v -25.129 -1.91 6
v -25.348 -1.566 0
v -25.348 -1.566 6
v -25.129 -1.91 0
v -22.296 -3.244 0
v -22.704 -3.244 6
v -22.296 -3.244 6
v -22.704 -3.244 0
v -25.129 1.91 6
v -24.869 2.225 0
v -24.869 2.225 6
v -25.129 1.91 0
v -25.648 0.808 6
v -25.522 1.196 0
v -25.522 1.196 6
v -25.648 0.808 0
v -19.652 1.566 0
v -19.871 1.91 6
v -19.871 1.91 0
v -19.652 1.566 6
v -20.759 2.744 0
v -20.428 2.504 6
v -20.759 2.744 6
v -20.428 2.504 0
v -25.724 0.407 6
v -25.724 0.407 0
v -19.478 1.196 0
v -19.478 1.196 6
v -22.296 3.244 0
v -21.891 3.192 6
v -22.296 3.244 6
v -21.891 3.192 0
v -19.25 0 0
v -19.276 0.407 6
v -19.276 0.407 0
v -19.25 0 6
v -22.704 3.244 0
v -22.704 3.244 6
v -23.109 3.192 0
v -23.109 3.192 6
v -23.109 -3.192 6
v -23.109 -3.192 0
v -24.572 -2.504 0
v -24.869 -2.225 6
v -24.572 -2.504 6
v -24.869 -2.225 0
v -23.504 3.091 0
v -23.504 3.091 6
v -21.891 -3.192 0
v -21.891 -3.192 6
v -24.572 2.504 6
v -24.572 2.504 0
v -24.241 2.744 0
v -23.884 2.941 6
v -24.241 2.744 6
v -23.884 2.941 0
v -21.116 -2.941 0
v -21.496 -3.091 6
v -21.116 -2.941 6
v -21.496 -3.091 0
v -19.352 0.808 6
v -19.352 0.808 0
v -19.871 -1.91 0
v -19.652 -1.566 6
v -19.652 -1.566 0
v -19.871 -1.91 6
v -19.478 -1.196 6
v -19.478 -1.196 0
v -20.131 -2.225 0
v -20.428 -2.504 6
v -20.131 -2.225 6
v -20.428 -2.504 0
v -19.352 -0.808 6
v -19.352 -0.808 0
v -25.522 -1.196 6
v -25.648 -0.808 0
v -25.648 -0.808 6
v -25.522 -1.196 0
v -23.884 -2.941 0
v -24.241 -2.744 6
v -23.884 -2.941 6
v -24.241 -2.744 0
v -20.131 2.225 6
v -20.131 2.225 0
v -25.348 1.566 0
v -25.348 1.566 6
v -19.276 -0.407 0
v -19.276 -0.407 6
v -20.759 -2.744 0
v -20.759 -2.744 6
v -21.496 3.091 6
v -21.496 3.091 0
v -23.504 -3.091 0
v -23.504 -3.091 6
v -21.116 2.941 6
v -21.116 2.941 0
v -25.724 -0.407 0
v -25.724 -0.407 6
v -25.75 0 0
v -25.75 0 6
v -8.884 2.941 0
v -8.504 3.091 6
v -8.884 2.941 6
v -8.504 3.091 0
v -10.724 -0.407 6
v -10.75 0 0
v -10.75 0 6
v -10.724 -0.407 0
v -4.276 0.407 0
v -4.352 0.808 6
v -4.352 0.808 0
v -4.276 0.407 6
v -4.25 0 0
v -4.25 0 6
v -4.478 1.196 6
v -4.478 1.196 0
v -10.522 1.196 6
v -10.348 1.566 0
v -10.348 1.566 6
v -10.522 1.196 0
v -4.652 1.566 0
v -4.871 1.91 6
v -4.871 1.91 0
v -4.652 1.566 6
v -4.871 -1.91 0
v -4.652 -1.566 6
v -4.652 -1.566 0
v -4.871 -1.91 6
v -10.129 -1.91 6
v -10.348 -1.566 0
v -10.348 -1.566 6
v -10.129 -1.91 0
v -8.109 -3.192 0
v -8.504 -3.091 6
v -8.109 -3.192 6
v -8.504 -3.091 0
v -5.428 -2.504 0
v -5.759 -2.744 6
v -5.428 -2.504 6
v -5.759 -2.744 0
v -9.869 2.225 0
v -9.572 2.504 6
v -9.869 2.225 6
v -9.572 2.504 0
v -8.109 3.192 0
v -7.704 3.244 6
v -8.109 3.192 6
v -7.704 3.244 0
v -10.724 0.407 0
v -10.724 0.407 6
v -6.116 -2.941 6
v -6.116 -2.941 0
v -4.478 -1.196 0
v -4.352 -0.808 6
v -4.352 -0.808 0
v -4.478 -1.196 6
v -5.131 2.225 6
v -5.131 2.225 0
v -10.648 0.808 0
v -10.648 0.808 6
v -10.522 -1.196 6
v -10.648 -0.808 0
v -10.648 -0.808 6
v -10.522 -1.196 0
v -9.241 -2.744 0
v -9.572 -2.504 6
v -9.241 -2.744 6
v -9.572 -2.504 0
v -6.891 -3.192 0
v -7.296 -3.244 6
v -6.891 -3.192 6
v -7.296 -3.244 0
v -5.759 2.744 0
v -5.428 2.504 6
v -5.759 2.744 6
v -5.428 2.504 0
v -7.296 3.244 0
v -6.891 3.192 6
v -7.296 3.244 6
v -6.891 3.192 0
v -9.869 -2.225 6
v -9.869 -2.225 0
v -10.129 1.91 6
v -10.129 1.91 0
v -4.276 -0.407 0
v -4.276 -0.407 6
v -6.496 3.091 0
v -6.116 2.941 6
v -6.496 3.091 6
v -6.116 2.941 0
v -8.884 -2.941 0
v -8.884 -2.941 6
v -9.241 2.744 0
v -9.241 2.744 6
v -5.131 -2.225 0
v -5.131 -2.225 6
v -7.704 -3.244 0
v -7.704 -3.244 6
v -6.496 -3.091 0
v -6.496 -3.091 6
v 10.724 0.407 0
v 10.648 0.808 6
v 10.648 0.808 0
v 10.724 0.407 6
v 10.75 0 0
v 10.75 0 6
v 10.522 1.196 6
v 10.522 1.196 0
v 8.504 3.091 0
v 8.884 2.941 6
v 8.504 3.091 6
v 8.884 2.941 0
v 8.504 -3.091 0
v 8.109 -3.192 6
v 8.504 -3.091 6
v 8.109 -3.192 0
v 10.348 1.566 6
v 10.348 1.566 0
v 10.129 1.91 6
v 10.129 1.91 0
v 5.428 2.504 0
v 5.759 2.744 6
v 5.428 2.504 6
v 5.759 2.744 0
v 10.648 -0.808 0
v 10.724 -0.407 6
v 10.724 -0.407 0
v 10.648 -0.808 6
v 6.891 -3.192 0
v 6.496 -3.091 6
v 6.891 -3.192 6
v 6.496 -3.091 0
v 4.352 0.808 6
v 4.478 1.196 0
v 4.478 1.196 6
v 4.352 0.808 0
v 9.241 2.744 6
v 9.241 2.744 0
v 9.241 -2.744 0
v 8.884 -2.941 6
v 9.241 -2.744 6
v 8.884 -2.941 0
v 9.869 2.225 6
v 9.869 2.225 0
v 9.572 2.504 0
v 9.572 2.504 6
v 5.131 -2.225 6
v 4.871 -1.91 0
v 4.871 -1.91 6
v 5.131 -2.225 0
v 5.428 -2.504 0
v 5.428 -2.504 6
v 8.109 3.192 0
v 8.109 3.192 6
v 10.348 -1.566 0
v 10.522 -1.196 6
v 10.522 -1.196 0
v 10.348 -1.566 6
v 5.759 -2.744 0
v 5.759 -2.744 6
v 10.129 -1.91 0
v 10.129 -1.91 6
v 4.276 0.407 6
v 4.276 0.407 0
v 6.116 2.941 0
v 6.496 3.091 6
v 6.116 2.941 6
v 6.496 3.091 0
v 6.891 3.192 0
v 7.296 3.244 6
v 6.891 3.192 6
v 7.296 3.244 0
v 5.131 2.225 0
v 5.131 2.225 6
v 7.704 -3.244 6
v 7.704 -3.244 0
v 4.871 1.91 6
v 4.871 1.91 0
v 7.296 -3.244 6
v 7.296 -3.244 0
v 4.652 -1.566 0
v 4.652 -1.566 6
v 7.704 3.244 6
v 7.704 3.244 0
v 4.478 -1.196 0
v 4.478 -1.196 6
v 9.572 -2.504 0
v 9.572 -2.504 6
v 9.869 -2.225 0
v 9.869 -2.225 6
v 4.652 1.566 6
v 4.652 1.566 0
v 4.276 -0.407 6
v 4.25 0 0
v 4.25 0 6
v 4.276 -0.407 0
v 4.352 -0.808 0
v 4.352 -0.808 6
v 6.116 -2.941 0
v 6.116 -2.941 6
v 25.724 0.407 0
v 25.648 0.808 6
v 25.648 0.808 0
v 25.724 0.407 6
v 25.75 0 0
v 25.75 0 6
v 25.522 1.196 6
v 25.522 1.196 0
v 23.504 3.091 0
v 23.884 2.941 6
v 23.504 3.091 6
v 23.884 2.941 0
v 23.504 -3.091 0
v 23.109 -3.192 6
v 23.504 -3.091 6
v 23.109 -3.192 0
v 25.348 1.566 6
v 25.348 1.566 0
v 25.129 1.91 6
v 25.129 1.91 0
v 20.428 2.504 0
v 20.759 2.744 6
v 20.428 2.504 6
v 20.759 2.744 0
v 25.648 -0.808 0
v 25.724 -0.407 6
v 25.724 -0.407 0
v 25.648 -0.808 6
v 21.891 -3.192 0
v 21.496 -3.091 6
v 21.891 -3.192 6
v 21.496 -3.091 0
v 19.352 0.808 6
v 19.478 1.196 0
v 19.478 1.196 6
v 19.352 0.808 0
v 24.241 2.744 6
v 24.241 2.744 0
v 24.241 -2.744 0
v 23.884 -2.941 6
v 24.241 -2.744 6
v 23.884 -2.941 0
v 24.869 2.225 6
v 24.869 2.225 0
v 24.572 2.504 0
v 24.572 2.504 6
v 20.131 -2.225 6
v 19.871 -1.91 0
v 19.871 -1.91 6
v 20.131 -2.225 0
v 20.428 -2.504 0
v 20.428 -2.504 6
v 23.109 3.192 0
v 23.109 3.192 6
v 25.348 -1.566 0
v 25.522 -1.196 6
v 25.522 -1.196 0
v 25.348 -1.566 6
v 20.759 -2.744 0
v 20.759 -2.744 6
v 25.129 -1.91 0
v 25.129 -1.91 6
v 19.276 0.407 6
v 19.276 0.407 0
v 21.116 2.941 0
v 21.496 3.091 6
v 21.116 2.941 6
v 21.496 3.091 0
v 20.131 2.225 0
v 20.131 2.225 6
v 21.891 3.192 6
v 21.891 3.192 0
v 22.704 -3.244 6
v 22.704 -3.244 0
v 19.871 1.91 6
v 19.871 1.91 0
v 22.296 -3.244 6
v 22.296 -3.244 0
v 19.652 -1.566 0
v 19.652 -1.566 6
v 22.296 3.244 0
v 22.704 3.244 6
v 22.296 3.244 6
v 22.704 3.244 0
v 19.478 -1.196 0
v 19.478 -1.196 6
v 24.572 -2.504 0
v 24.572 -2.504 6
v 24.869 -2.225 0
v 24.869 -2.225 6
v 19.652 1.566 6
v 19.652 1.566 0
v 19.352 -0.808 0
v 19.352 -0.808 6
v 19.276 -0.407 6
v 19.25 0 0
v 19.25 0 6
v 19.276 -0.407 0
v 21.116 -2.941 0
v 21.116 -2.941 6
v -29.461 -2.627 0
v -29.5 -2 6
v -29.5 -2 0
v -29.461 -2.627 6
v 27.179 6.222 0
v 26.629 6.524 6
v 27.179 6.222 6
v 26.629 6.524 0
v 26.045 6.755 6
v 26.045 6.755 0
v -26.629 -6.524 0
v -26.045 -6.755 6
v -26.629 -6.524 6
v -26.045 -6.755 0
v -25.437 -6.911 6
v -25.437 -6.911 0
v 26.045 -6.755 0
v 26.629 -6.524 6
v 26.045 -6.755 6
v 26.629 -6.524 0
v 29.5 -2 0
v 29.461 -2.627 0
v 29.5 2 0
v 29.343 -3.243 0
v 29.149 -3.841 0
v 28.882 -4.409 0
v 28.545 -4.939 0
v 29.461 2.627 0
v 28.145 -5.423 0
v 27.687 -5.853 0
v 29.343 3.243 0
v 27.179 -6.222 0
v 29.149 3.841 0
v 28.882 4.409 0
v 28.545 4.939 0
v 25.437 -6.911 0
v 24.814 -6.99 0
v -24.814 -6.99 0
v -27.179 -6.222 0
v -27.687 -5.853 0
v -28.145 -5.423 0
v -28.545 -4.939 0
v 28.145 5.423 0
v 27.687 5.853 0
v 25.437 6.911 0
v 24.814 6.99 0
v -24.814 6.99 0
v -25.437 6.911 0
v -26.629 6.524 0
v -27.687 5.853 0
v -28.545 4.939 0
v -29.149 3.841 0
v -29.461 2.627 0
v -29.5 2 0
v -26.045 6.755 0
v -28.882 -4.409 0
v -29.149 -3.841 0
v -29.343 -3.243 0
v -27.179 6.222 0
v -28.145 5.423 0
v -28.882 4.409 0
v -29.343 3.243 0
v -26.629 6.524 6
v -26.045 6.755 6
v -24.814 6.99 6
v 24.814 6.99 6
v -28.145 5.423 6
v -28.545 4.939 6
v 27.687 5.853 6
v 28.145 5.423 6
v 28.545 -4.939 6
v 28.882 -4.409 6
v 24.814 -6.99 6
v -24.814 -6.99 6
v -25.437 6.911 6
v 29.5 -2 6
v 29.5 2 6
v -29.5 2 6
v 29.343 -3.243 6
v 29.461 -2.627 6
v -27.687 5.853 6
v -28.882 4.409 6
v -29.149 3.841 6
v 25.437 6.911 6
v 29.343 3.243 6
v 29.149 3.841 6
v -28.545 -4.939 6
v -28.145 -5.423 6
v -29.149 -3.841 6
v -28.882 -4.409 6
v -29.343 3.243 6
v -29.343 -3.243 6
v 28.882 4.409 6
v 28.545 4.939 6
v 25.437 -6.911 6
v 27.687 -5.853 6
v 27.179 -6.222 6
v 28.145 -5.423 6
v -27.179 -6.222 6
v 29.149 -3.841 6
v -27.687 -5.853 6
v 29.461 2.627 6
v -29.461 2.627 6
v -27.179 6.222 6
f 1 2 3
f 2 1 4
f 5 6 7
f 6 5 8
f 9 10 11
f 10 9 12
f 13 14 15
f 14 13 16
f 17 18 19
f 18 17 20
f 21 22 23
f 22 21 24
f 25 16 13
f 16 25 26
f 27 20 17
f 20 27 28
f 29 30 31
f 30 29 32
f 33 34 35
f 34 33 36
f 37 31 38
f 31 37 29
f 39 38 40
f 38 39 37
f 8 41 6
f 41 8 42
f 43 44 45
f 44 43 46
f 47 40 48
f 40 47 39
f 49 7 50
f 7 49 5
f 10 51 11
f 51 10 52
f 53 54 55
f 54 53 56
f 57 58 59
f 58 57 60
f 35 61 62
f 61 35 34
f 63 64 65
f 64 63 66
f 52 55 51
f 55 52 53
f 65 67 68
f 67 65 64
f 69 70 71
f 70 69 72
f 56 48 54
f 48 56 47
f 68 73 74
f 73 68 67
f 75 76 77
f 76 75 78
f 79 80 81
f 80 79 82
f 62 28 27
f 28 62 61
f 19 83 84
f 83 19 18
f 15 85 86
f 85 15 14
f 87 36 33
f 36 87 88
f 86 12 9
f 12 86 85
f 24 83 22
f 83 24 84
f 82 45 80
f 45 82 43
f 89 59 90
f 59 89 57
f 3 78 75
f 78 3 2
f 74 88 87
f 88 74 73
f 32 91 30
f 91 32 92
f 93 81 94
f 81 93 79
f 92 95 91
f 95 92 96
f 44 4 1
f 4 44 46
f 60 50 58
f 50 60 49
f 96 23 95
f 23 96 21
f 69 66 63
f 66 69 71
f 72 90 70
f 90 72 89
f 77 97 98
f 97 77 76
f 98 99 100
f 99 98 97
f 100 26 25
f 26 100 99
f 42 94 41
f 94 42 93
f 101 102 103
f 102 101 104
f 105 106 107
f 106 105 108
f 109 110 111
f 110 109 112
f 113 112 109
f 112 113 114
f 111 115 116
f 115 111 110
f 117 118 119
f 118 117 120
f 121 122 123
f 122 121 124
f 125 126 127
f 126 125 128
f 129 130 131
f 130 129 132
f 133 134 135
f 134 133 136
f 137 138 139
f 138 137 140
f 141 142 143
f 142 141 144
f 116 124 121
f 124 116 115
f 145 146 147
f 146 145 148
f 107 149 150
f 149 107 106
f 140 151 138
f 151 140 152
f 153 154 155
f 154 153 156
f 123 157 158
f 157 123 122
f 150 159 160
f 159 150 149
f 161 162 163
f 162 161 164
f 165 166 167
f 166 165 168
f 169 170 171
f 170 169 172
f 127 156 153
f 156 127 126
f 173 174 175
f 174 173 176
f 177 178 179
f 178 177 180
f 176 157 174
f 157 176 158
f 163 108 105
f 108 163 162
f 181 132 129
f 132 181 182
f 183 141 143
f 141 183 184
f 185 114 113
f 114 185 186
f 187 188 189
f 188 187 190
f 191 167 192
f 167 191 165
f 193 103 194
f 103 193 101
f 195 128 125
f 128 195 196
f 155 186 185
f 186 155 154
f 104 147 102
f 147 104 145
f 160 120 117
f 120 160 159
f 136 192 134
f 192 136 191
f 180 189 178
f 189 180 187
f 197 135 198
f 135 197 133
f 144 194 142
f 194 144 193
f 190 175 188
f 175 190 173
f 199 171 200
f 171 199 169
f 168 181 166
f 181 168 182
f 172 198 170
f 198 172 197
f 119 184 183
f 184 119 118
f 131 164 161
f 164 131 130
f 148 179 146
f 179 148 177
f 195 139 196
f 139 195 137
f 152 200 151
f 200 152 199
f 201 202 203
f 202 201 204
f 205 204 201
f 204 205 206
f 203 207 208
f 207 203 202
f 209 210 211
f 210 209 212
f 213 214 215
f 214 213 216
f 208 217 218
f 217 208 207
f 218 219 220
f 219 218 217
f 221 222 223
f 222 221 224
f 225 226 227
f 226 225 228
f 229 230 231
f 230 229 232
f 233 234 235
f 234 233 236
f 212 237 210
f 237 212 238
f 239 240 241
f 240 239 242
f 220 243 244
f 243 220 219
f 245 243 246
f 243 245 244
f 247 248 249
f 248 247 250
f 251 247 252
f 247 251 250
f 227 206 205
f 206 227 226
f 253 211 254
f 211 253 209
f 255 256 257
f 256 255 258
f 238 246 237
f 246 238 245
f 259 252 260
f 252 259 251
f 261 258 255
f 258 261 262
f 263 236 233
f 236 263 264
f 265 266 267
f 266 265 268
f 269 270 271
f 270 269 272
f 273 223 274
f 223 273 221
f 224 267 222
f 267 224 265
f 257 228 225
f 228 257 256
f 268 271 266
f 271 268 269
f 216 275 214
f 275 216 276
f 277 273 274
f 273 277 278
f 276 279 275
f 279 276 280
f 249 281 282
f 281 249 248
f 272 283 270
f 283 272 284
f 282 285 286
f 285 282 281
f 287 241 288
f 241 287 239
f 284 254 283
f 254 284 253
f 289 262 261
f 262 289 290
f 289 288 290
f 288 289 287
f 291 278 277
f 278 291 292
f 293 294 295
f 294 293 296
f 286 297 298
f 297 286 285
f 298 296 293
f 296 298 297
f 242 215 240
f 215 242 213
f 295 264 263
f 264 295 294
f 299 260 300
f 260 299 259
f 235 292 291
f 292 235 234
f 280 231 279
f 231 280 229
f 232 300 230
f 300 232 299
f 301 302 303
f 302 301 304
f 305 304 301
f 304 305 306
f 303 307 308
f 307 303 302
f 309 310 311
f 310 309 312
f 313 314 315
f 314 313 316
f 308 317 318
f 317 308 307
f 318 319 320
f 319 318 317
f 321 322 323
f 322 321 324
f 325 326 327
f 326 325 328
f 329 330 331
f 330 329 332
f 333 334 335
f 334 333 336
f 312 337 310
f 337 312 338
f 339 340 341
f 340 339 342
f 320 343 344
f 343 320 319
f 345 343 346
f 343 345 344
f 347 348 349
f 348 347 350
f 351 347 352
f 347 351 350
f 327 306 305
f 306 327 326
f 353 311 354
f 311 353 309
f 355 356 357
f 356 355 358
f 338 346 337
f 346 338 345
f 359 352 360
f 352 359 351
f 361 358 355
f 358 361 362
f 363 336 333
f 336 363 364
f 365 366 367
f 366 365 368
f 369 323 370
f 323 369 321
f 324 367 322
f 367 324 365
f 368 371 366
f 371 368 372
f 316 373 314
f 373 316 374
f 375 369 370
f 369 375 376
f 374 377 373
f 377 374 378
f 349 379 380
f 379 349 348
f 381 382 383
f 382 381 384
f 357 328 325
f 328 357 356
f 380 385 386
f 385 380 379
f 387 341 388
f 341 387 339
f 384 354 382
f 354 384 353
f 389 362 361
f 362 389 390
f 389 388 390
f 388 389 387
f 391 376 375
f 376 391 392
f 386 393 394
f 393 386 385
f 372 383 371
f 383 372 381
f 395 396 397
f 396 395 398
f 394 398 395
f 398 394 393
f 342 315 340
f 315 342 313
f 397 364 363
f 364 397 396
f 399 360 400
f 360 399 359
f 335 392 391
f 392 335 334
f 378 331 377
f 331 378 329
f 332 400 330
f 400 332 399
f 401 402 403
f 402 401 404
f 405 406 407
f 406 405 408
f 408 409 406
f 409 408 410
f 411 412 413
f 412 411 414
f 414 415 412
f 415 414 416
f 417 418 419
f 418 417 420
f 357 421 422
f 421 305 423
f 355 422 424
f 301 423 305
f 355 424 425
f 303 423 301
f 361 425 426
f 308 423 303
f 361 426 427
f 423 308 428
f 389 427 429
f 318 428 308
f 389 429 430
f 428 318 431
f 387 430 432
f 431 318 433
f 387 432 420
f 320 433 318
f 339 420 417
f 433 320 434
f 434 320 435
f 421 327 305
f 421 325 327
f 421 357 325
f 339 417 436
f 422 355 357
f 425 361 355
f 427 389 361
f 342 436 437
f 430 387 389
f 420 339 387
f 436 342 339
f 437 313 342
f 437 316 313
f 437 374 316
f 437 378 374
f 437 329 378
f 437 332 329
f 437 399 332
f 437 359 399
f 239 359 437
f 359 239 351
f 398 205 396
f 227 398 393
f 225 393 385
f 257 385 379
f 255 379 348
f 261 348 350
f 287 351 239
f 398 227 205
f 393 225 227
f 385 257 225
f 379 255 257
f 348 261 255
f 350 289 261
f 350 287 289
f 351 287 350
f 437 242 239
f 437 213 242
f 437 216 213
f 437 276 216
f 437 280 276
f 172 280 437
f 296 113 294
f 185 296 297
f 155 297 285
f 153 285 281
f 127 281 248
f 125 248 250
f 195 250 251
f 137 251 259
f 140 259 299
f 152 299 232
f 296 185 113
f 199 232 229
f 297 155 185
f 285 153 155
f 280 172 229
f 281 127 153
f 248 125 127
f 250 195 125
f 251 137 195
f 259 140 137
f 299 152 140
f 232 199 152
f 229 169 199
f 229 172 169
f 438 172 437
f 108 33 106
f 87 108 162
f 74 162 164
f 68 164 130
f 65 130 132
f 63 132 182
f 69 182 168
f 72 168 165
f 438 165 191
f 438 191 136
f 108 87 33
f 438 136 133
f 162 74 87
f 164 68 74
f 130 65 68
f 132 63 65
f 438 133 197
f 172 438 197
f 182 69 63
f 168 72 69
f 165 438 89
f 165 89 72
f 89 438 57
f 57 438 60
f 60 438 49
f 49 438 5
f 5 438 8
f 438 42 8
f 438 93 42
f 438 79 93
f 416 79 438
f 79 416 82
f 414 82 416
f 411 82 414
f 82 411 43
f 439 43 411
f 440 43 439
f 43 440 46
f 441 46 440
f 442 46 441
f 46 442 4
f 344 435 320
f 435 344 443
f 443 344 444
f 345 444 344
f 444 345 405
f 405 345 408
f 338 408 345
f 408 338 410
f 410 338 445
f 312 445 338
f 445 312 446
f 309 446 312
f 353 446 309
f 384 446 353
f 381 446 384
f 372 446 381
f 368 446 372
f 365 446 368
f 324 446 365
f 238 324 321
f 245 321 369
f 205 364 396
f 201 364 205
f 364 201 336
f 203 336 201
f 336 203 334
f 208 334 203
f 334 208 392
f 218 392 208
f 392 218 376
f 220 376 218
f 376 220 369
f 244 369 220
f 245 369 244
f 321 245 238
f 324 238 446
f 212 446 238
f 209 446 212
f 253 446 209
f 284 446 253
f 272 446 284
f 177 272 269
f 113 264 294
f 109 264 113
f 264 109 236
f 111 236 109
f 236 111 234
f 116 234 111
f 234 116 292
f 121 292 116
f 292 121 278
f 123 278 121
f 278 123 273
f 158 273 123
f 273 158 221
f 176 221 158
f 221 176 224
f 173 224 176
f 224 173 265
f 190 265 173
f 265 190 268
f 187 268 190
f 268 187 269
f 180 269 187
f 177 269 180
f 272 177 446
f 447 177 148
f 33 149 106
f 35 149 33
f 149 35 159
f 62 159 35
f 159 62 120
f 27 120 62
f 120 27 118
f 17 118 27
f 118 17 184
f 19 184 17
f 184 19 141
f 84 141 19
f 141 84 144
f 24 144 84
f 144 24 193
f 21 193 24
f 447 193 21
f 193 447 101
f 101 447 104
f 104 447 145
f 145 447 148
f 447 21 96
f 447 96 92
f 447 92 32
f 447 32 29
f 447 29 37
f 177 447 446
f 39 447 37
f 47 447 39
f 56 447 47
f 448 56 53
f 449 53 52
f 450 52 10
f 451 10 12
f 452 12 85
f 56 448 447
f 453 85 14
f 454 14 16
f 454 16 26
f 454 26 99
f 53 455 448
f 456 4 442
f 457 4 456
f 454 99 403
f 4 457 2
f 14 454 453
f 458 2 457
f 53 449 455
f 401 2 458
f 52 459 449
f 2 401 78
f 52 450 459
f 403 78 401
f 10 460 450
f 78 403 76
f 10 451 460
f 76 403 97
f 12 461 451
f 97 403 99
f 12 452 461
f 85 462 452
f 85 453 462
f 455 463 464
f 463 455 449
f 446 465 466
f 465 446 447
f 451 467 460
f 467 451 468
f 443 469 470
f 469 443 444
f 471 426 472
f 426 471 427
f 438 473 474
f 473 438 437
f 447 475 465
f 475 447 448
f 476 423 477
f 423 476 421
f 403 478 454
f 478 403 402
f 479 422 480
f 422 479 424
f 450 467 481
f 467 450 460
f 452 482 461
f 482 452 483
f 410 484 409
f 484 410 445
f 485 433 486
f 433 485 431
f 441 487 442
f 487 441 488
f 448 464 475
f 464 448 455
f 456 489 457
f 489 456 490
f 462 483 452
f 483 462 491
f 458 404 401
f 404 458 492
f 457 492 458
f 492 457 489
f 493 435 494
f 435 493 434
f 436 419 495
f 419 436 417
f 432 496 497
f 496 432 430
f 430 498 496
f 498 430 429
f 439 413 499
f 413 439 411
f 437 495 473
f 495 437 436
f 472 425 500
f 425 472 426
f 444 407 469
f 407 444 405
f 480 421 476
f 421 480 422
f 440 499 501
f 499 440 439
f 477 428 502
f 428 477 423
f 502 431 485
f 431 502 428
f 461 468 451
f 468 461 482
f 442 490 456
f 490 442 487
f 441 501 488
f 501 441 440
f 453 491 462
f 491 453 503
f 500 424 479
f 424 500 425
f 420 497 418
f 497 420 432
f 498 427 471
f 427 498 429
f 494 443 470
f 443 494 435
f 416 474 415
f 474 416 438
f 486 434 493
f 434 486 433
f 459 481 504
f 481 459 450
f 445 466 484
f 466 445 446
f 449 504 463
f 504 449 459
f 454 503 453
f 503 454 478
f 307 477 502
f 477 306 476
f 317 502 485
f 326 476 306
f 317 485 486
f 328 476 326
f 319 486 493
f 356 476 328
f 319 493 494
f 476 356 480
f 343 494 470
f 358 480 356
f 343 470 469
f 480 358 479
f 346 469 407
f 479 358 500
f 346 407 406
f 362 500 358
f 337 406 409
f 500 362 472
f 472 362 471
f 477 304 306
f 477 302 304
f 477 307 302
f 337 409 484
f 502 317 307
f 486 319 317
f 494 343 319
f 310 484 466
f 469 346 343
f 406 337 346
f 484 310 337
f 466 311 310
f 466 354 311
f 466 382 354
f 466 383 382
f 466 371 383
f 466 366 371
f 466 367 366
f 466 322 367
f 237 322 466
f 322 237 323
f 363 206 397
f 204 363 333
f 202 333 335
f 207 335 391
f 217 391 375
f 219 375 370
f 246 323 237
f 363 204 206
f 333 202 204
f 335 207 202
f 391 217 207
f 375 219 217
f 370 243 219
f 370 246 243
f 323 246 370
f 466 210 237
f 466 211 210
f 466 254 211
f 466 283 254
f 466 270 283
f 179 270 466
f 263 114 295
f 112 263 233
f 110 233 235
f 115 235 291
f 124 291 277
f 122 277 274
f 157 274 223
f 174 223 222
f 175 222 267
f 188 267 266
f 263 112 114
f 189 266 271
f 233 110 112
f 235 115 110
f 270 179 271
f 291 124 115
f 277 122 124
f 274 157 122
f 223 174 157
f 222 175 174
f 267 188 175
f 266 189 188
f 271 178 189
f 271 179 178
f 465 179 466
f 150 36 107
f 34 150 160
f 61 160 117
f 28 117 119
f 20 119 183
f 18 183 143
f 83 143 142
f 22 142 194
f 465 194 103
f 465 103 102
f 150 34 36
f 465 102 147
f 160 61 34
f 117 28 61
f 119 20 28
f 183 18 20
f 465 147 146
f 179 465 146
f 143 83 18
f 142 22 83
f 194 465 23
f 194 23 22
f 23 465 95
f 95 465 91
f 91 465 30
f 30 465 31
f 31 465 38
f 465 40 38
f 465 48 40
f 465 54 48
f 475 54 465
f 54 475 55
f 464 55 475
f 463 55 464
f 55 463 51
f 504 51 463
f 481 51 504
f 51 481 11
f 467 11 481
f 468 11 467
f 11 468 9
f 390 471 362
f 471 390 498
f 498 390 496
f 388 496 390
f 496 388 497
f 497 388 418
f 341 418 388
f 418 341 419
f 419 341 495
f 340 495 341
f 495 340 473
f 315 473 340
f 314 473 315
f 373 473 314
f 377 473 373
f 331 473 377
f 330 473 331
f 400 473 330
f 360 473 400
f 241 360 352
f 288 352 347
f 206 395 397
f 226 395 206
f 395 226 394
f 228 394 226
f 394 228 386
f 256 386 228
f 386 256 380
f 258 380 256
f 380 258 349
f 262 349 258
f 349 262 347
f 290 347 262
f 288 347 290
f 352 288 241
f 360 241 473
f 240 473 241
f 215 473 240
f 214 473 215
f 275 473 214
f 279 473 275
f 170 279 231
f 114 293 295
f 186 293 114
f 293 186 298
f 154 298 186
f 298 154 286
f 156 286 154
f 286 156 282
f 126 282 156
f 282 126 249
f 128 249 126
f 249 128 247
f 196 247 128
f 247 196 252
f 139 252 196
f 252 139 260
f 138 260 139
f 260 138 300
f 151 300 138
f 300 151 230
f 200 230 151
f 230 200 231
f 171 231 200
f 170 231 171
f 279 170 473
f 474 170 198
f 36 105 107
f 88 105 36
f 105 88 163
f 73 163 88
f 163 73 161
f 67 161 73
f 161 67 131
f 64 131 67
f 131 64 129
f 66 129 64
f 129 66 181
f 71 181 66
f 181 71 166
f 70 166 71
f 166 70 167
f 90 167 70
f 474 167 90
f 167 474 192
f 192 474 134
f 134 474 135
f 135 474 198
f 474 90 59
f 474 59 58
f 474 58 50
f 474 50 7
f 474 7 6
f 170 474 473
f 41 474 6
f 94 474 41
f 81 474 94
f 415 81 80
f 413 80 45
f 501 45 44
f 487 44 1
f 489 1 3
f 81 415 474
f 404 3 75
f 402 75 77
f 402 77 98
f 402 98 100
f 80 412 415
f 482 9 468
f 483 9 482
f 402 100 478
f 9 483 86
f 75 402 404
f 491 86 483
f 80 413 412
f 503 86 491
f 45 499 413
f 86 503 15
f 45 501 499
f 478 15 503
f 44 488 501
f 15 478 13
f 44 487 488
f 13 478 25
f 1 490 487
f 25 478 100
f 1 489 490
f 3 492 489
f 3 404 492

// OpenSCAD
$fn = 50;


difference() {
	union() {
		hull() {
			translate(v = [-24.5000000000, 2.0000000000, 0]) {
				cylinder(h = 6, r = 5);
			}
			translate(v = [24.5000000000, 2.0000000000, 0]) {
				cylinder(h = 6, r = 5);
			}
			translate(v = [-24.5000000000, -2.0000000000, 0]) {
				cylinder(h = 6, r = 5);
			}
			translate(v = [24.5000000000, -2.0000000000, 0]) {
				cylinder(h = 6, r = 5);
			}
		}
	}
	union() {
		translate(v = [-22.5000000000, 0.0000000000, -100.0000000000]) {
			cylinder(h = 200, r = 3.2500000000);
		}
		translate(v = [-7.5000000000, 0.0000000000, -100.0000000000]) {
			cylinder(h = 200, r = 3.2500000000);
		}
		translate(v = [7.5000000000, 0.0000000000, -100.0000000000]) {
			cylinder(h = 200, r = 3.2500000000);
		}
		translate(v = [22.5000000000, 0.0000000000, -100.0000000000]) {
			cylinder(h = 200, r = 3.2500000000);
		}
	}
}
